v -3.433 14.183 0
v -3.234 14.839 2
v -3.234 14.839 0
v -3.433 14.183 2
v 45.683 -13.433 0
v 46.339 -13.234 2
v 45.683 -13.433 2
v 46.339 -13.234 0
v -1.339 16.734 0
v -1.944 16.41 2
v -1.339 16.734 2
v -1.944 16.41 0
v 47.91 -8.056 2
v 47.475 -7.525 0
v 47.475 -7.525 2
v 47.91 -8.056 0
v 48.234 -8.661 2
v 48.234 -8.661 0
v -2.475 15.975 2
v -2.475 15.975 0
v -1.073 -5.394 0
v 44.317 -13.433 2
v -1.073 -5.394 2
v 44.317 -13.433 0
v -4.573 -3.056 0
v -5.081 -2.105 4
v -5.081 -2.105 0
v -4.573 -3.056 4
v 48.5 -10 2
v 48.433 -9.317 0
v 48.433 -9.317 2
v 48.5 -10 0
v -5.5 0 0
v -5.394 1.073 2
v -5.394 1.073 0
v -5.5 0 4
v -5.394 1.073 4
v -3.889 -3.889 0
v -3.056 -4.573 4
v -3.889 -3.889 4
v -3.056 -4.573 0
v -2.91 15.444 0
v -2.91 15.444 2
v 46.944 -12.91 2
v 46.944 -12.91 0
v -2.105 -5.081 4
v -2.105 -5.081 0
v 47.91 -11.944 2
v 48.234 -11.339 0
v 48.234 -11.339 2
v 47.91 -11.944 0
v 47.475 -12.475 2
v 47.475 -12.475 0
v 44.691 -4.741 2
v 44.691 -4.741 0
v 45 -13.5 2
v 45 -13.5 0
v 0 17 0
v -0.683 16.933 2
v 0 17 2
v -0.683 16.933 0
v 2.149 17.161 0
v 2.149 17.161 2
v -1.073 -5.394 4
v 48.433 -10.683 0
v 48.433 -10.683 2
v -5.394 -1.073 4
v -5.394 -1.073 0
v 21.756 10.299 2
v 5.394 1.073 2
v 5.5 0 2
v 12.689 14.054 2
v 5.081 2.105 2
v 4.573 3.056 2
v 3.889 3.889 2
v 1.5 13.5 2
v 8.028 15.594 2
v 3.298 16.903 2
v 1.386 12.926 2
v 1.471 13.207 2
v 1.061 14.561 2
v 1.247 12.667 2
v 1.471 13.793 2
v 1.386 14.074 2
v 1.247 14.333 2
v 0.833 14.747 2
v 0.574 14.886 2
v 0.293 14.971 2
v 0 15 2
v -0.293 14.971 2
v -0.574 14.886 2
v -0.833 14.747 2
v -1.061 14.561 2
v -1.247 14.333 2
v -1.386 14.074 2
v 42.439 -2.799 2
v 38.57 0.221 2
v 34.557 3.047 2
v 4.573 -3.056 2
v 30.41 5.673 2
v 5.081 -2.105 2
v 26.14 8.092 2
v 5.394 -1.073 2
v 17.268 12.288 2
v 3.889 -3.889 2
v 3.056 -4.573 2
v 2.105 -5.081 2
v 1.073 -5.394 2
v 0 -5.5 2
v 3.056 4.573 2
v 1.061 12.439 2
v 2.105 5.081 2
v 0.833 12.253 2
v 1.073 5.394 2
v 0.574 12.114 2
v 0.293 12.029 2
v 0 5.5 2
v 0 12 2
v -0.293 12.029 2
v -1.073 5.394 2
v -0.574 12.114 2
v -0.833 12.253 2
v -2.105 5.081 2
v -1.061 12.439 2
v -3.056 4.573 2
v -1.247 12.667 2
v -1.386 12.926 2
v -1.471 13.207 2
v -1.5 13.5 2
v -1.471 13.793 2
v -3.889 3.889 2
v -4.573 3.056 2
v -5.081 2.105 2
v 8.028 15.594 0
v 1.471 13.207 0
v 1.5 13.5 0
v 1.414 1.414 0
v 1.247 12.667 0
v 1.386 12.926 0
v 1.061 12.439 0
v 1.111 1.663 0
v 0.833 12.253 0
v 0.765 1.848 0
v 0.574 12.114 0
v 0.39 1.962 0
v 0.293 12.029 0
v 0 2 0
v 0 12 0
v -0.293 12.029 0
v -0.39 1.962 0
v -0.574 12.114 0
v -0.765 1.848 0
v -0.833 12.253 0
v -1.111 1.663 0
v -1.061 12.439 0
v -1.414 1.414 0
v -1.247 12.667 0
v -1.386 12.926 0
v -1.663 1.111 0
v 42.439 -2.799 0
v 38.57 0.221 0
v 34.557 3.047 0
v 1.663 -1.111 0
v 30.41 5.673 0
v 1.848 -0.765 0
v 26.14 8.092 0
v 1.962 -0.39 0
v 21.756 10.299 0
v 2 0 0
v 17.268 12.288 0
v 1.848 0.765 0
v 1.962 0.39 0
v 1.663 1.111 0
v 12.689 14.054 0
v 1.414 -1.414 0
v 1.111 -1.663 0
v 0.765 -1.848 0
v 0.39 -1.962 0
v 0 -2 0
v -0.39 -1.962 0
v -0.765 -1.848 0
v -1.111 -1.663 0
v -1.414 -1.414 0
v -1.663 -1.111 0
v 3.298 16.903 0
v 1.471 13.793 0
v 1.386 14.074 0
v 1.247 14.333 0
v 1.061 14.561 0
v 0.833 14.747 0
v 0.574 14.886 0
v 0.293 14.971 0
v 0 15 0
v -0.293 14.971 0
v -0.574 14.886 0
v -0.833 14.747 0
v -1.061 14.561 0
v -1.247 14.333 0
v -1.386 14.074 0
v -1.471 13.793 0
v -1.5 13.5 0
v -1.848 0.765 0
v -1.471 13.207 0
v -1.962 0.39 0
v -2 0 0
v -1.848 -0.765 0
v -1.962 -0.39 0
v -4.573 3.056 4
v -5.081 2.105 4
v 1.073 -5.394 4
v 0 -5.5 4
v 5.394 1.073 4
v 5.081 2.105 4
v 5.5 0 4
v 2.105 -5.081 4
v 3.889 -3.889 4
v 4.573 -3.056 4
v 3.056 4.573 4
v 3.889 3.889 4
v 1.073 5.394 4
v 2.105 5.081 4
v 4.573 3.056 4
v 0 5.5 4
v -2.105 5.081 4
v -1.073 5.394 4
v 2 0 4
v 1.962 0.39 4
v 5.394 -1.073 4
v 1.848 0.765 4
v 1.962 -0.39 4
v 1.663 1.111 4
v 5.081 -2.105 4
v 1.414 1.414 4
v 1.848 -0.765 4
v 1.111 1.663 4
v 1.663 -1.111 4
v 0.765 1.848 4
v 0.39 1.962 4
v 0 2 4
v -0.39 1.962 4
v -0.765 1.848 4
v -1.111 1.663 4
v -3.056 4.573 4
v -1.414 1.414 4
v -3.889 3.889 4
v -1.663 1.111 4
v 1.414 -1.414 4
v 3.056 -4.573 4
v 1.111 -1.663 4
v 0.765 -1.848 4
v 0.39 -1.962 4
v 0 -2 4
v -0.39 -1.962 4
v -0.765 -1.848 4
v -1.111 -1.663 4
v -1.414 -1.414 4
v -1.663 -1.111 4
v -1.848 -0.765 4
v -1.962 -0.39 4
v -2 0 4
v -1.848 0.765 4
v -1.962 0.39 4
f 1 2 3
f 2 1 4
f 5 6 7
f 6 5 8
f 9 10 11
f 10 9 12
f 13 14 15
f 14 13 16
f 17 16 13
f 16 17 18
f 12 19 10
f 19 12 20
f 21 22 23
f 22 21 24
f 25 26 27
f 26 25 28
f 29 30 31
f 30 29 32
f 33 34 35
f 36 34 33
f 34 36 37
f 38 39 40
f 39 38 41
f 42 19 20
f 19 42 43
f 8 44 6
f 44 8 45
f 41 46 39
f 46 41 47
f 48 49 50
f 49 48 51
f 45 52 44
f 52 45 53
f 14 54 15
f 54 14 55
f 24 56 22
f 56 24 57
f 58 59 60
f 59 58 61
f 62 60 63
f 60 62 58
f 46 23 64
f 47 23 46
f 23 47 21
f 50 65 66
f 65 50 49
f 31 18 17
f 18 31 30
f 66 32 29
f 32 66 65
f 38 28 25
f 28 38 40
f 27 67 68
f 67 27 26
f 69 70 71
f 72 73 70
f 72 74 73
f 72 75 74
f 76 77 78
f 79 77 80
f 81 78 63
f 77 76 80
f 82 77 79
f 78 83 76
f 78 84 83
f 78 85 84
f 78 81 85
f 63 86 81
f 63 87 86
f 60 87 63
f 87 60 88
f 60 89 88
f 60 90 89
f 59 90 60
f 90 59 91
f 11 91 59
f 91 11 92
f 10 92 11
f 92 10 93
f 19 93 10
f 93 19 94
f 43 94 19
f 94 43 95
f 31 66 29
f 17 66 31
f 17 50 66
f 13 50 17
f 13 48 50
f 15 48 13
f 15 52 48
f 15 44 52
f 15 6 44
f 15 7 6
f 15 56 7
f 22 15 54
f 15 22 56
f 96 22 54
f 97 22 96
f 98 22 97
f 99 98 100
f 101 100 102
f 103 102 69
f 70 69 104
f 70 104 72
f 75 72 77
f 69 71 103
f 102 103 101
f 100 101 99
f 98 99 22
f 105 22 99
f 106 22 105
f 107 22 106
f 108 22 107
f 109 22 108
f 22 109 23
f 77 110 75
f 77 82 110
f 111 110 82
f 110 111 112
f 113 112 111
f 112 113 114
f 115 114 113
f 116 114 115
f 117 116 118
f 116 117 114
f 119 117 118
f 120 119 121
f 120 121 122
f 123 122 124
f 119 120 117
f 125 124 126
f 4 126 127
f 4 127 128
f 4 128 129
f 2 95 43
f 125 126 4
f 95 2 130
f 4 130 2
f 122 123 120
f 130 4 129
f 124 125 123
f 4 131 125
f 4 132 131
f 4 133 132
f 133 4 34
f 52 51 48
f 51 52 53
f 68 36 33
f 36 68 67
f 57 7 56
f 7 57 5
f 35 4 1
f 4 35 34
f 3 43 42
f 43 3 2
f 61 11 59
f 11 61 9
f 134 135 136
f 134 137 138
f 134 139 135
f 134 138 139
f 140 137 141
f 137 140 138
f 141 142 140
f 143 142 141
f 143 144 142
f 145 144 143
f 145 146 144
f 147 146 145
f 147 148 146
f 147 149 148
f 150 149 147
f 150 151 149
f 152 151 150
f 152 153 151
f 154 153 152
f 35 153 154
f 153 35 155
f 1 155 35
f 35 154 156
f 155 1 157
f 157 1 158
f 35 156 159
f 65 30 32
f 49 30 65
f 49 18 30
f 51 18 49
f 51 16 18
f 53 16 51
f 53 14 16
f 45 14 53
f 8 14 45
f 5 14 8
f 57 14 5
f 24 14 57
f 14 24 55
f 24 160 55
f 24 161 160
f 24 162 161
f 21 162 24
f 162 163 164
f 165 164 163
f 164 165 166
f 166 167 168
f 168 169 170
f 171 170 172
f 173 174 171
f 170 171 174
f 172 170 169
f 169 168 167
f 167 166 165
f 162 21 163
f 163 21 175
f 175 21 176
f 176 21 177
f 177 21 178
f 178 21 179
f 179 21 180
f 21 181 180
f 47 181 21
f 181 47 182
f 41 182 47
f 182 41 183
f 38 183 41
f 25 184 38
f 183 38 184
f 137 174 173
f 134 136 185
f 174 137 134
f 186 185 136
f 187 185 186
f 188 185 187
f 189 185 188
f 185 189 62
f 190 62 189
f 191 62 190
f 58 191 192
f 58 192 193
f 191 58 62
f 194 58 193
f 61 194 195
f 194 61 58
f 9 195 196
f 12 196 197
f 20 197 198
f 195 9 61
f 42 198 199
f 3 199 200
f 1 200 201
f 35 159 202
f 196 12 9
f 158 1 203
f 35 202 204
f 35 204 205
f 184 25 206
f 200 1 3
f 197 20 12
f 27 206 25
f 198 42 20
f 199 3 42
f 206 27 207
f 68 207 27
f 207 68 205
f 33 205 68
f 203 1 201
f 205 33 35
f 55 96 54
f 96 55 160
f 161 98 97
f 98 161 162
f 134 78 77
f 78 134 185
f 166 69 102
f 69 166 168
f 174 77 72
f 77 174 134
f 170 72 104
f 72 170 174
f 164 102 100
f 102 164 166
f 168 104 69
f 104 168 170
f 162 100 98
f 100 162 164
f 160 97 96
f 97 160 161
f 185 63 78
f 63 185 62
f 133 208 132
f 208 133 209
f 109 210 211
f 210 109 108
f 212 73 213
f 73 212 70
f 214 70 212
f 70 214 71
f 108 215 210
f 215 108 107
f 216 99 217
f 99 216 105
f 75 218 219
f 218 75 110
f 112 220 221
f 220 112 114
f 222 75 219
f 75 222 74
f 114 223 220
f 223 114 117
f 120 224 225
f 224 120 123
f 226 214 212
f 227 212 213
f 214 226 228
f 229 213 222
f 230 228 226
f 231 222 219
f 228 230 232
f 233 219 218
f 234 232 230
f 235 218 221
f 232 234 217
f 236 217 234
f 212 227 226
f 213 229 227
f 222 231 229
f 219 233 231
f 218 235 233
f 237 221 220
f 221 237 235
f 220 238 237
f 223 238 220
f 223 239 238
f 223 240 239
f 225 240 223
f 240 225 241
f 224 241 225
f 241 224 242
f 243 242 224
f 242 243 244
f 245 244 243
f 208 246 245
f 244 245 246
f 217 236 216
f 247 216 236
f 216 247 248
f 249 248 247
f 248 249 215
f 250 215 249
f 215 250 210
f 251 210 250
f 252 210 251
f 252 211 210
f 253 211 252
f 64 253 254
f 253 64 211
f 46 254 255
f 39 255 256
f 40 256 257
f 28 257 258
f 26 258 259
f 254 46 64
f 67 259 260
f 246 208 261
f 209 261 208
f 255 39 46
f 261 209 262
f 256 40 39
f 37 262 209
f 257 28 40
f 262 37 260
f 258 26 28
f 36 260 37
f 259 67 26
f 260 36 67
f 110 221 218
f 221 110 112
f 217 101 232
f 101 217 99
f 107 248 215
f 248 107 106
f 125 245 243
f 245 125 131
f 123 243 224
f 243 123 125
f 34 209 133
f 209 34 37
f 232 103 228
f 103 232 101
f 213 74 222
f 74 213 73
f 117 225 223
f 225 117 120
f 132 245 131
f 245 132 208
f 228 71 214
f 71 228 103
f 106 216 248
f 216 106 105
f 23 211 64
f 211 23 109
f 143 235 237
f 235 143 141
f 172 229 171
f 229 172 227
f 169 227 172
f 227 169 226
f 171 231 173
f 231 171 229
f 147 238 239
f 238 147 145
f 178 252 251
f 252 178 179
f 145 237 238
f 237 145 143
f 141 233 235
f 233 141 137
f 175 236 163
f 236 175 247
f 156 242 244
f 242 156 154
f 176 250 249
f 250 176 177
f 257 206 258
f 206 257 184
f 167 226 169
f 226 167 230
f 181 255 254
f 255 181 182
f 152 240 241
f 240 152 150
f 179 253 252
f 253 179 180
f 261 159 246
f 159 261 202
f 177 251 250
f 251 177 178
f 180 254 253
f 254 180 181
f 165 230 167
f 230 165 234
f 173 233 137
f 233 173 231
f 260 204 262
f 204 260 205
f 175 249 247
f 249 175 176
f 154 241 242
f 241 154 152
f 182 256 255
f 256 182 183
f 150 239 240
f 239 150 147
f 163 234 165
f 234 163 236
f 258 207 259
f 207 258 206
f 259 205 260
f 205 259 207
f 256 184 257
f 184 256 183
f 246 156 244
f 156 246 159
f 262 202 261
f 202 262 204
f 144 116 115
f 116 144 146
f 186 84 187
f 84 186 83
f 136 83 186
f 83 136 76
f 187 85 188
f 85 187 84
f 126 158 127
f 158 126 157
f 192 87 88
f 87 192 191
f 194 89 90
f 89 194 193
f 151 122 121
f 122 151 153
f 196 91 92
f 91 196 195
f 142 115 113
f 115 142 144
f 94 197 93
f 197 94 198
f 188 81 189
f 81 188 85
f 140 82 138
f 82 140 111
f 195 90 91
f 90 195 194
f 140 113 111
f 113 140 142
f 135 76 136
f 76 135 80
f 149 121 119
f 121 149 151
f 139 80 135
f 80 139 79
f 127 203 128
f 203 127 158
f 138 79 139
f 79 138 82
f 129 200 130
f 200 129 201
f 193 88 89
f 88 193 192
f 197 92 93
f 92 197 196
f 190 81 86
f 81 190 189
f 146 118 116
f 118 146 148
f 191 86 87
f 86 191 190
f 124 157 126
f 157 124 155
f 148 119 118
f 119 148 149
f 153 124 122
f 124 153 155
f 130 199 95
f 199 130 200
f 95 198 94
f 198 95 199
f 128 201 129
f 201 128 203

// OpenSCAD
$fn = 32;
/* linear_extrude(height = 10, center = true, convexity = 10) */
/*    import (file = "wings.svg"); */


thickness = 2;

difference() {
  union() {
    cylinder(h=4, r=5.5);
    intersection() {
      hull() {
        cylinder(h=thickness, r=5.5);
        translate([0, 13.5, 0]) {
          cylinder(h=thickness, r=3.5);
        }
        translate([45, -10, 0]) {
          cylinder(h=thickness, r=3.5);
        }
        translate([20, 15, 0]) {
          cylinder(h=thickness, r=3.5);
        }
        /* translate([25, 10, 0]) { */
        /*   cylinder(h=thickness, r=3.5); */
        /* } */
        /* translate([40, 4, 0]) { */
        /*   cylinder(h=thickness, r=3.5); */
        /* } */
      }
      translate([-21.0, -80.1, 0]) {
        cylinder(h=thickness, r=100, $fn=128);
      }
    }
  }
  cylinder(h=thickness*2, r=2);
  translate([0, 13.5, 0]) {
    cylinder(h=thickness*2, r=1.5);
  }
}
